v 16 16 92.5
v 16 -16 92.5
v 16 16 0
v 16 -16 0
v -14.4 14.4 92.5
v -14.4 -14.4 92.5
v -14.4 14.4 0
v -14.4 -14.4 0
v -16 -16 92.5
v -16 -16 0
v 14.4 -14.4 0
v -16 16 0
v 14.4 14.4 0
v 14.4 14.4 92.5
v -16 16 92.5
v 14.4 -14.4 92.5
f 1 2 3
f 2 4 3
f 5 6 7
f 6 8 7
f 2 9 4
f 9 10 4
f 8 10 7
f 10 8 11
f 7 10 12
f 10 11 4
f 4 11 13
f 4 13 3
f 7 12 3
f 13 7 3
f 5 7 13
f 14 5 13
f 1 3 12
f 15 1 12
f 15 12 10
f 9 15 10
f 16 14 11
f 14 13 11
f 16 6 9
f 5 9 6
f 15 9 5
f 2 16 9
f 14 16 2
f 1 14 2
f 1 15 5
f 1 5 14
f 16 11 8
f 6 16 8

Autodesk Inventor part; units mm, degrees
ref_plane "YZ Plane" through (0, 0, 0) normal (1, 0, 0) x (0, 1, 0)
ref_plane "XZ Plane" through (0, 0, 0) normal (0, 1, 0) x (-1, 0, 0)
ref_plane "XY Plane" through (0, 0, 0) normal (0, 0, 1) x (1, 0, 0)
sketch "スケッチ1" plane through (0, 0, 0) normal (0, 0, 1) x (1, 0, 0)
  line L0 (-16, -16) -> (16, -16)
  line L1 (16, -16) -> (16, 16)
  line L2 (16, 16) -> (-16, 16)
  line L3 (-16, 16) -> (-16, -16)
  line L4 (-16, -16) -> (16, 16) construction
  line L5 (16, -16) -> (-16, 16) construction
  line L6 (-14.4, 14.4) -> (14.4, 14.4)
  line L7 (14.4, 14.4) -> (14.4, -14.4)
  line L8 (14.4, -14.4) -> (-14.4, -14.4)
  line L9 (-14.4, -14.4) -> (-14.4, 14.4)
  point P0 (0, 0)
  dimension "d0" = 32
  dimension "d1" = 32
  dimension "d2" = 1.6
extrude "押し出し1" add sketch "スケッチ1" along normal blind 92.5
properties part number "PipeB"
